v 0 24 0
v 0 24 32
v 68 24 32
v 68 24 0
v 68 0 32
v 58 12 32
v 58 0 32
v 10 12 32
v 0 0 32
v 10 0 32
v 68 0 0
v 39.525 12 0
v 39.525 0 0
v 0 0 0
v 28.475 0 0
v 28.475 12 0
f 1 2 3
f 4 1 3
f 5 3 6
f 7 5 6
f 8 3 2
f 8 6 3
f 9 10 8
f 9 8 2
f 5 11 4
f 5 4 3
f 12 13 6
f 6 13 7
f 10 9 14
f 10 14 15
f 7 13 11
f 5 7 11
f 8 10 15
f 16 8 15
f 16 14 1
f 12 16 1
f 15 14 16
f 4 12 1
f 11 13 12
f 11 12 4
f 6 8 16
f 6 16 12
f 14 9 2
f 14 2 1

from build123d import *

# Parameters (mm, degrees)
F1_DEPTH = 24
F2_DEPTH = 12


with BuildPart() as f1:
    # F0 (on Front) → F1 (new body)
    with BuildSketch(Plane.XZ):
        Polygon((0, 32), (0, 0), (28.475209, 0), (10, 32), align=None)
        Polygon((10, 32), (28.475209, 0), (39.524791, 0), (58, 32), align=None)
        Polygon((58, 32), (39.524791, 0), (68, 0), (68, 32), align=None)
    extrude(amount=-F1_DEPTH)

    # F0 (on Front) → F2 (cut)
    with BuildSketch(Plane.XZ):
        Polygon((10, 32), (28.475209, 0), (39.524791, 0), (58, 32), align=None)
    extrude(amount=-F2_DEPTH, mode=Mode.SUBTRACT)


solid = f1.part
